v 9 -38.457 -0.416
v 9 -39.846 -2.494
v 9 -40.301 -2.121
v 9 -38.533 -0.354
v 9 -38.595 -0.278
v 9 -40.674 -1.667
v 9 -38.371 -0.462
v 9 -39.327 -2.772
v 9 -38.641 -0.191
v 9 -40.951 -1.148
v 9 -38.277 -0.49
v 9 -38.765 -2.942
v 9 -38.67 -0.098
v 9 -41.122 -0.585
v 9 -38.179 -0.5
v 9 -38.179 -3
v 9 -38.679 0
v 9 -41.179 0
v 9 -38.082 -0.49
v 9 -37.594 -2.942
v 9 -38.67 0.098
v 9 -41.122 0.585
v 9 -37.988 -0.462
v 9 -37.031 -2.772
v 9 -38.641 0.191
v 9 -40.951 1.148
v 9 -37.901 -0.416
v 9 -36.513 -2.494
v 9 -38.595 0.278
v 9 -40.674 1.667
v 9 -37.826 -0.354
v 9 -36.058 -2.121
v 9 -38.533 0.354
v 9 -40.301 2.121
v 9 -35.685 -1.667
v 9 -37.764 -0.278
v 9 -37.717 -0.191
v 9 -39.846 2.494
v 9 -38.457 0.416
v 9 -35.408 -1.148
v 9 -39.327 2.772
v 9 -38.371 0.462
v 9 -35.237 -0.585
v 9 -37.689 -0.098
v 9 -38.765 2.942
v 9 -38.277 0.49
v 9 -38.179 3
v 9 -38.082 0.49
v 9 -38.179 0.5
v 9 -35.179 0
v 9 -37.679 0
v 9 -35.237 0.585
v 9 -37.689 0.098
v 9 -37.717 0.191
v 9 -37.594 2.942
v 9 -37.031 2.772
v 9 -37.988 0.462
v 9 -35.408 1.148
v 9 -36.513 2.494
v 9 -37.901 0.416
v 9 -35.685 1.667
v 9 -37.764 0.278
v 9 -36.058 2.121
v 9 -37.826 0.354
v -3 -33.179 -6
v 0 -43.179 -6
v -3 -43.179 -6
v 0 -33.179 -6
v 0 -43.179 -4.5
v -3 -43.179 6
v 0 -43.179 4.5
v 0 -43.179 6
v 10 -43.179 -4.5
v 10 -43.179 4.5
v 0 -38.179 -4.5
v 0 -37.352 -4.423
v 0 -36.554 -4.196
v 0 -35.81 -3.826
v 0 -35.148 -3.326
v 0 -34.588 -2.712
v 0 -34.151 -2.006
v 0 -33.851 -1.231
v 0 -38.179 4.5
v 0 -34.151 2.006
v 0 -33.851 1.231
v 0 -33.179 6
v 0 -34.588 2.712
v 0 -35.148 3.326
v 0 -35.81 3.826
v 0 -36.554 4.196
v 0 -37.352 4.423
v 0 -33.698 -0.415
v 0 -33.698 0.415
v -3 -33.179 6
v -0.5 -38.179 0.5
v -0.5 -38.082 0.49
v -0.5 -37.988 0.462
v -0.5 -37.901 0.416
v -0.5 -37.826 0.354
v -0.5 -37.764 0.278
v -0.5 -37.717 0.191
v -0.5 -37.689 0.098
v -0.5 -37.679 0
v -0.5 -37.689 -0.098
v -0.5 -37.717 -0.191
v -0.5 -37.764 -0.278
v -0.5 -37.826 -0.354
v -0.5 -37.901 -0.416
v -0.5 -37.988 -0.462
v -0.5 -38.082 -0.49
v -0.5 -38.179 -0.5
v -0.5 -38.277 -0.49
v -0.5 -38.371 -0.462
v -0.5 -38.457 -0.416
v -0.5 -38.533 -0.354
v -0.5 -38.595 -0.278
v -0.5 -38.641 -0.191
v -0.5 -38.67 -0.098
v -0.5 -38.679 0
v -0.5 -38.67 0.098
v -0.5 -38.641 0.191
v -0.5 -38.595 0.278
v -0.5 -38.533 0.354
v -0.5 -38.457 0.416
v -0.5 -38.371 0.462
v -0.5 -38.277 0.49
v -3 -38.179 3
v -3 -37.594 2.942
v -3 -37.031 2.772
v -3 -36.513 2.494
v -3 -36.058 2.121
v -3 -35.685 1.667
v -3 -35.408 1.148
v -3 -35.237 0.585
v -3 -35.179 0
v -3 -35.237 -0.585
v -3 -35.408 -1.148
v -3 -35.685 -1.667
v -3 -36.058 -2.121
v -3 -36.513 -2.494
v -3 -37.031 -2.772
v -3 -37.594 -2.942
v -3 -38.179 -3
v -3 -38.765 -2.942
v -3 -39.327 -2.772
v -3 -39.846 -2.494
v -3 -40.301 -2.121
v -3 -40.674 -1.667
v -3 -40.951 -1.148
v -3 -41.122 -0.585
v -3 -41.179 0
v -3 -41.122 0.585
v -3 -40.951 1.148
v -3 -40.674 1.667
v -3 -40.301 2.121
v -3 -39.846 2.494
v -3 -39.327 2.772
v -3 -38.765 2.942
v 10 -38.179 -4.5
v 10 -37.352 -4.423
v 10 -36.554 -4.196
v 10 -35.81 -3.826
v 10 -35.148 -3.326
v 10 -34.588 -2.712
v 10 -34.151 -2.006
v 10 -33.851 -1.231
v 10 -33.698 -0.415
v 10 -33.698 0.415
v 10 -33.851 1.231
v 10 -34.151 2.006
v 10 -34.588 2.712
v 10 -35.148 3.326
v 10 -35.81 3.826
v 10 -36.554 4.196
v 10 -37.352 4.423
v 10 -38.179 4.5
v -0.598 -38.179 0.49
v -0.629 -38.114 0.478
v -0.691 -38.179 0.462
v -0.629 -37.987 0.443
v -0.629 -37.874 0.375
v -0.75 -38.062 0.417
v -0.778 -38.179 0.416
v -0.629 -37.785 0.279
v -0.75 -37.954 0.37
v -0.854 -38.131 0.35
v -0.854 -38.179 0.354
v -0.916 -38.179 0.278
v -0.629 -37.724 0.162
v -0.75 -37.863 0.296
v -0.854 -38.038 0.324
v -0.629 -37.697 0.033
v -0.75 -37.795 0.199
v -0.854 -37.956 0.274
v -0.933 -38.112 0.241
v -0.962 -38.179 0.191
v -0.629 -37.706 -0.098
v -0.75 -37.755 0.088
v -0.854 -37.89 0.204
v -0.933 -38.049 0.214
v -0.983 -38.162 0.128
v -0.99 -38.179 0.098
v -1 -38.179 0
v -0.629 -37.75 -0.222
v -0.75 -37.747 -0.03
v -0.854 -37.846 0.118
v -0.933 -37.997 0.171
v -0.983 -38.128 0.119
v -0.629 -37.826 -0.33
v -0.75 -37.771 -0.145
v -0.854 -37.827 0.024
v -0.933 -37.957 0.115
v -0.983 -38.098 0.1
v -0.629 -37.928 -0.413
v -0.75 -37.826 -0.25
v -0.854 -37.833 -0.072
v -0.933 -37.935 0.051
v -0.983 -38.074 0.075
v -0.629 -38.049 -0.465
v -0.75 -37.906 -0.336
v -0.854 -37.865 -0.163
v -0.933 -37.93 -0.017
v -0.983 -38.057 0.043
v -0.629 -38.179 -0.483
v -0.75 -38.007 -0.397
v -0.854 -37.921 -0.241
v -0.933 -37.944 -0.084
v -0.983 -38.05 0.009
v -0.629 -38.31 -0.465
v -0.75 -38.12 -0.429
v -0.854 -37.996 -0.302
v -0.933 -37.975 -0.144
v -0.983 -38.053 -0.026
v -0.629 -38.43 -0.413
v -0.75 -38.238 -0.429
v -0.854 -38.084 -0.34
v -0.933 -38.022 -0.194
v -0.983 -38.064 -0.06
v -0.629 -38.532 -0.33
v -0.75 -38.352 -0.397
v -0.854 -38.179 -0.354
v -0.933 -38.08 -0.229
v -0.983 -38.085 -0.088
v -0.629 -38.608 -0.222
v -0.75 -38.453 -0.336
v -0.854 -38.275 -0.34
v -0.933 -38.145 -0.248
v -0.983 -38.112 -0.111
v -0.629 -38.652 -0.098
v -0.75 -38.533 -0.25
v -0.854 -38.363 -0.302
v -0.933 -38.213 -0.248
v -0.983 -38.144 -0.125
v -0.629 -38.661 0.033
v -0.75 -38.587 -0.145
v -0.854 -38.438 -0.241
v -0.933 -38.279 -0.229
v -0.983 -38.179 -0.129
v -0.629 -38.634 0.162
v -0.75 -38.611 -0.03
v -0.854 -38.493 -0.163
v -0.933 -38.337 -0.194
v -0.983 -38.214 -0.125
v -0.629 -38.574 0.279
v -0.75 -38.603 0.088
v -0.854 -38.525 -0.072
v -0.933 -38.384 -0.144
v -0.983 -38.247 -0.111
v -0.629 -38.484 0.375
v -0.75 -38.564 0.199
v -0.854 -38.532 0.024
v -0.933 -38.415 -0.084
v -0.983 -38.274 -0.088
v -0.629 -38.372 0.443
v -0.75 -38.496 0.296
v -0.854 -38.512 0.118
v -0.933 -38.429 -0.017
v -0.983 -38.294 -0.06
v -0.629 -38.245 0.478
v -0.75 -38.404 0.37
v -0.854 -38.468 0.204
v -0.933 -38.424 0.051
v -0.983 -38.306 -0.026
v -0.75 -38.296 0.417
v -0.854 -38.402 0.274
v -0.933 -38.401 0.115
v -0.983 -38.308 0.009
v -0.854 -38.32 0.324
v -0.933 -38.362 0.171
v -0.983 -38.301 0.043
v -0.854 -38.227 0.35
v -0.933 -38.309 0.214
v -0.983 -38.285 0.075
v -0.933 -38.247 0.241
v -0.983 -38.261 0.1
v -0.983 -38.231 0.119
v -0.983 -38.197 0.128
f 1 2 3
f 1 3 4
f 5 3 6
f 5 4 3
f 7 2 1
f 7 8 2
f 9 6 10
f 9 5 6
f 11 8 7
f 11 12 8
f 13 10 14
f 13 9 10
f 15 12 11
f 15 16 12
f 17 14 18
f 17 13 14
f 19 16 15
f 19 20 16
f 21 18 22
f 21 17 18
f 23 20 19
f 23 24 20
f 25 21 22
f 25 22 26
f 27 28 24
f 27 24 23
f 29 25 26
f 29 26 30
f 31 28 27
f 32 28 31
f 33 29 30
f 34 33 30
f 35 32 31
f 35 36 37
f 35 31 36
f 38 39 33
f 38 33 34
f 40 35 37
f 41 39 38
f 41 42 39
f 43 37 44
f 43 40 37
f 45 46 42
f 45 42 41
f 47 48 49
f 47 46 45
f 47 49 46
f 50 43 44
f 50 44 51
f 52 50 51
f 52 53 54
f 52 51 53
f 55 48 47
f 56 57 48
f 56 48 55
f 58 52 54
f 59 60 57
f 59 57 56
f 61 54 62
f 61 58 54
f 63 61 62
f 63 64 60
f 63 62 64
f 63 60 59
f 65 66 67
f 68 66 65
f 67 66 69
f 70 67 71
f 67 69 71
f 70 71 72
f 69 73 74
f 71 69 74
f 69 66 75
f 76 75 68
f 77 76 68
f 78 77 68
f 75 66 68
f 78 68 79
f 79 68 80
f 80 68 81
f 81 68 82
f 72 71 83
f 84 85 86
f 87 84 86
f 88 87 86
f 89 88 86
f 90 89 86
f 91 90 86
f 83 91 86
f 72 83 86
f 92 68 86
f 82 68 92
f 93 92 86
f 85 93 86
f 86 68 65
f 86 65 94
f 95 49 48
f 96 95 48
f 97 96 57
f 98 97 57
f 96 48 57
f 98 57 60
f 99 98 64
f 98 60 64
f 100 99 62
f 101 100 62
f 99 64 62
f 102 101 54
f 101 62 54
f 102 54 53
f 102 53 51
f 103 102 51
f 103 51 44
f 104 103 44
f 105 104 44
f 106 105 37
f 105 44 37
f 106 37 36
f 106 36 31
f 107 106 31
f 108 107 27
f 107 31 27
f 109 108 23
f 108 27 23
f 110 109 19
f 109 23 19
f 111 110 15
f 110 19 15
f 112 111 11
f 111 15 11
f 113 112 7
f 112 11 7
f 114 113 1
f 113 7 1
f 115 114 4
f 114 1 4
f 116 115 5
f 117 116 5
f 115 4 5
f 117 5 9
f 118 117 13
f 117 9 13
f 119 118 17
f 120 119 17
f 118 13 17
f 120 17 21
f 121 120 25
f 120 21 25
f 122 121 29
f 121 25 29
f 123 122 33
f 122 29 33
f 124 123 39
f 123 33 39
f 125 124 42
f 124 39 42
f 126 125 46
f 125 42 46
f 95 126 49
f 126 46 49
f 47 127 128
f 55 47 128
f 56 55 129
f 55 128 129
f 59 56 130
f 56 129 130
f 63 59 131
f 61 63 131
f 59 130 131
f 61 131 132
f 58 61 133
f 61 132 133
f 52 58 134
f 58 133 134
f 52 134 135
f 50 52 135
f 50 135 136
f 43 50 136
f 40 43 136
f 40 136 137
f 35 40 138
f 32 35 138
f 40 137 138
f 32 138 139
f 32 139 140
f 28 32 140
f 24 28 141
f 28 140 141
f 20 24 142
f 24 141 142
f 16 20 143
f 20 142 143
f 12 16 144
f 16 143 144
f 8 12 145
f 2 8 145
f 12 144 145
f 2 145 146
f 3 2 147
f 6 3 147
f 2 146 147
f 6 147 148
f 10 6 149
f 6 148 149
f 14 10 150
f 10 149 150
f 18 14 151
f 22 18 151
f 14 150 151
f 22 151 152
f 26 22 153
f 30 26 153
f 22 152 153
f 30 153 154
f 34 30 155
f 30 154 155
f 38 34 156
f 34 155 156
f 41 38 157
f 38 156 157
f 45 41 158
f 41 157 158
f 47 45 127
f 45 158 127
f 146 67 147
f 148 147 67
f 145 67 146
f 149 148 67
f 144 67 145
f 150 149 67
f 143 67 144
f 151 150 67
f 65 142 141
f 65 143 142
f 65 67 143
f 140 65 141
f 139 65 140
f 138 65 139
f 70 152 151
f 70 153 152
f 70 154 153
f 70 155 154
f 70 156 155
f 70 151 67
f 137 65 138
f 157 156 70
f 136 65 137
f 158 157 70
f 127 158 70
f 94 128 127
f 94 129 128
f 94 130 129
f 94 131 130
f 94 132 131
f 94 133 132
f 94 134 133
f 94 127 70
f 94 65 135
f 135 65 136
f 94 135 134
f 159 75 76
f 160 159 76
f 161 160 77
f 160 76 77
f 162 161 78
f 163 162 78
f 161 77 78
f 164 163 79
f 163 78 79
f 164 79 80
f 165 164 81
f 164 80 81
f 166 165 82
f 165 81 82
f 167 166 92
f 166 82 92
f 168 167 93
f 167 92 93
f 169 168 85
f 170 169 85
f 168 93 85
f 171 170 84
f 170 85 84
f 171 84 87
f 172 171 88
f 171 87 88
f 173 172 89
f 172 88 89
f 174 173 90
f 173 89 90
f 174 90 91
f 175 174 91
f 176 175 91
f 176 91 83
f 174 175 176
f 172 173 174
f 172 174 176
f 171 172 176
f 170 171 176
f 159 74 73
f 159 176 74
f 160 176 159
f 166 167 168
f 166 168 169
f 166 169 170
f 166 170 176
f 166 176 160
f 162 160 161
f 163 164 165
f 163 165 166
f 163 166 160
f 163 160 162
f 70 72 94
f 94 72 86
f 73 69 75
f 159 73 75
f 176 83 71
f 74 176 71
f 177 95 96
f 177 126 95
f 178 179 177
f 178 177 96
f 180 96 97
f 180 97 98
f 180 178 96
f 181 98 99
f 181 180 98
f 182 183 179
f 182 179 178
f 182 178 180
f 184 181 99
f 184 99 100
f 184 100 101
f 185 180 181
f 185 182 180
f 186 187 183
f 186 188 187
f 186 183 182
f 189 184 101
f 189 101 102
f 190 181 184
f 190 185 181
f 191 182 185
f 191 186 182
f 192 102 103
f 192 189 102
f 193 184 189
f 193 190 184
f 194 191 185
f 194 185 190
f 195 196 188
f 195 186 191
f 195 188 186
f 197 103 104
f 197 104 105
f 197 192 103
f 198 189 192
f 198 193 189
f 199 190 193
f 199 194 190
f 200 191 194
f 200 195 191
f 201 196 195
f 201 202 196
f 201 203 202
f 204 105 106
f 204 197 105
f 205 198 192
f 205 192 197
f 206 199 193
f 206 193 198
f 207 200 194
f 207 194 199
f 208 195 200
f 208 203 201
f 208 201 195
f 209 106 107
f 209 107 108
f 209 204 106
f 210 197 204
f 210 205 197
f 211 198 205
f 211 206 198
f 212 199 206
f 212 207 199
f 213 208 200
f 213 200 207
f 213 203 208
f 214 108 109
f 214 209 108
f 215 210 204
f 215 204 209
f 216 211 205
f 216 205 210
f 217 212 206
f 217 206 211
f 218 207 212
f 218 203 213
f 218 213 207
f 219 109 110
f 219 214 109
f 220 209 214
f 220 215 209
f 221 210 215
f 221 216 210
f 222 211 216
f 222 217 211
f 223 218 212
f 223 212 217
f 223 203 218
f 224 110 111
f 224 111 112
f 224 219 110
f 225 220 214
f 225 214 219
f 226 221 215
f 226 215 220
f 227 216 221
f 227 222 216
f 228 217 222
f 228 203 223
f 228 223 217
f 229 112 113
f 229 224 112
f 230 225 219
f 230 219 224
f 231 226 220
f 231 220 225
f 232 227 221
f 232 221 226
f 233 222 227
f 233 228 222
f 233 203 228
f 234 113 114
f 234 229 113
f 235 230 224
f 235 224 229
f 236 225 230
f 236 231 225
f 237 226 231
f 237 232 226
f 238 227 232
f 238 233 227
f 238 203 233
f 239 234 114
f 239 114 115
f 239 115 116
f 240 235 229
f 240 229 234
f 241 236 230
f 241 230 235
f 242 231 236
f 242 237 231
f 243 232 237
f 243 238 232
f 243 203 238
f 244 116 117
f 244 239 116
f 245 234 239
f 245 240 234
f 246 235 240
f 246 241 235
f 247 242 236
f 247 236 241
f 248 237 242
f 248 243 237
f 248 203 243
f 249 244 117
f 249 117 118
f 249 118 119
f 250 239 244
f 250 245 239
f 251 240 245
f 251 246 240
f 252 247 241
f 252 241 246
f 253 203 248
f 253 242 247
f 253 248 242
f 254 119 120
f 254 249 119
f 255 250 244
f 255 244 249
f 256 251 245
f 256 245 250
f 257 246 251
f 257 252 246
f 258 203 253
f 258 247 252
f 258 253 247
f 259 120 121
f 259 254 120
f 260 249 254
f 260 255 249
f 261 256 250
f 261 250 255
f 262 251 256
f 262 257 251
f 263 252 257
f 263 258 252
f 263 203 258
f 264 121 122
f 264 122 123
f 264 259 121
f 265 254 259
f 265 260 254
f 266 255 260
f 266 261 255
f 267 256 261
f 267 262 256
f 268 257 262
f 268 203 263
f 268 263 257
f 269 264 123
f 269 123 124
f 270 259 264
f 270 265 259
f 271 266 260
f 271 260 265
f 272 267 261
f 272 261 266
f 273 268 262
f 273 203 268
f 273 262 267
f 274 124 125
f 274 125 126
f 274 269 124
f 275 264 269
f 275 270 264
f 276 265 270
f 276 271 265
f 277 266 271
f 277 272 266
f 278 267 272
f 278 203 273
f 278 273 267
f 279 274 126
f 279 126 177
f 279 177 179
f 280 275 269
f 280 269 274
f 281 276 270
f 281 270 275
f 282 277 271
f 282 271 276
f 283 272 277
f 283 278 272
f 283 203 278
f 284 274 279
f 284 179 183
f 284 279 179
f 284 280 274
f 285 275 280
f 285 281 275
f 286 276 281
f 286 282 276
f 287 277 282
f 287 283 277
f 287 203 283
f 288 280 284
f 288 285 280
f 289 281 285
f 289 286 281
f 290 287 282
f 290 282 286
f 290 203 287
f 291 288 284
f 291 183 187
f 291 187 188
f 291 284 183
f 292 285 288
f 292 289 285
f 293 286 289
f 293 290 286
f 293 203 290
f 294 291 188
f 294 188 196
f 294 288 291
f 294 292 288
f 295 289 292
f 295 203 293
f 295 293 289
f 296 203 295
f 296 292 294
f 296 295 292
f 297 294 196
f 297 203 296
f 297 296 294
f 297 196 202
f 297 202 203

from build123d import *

# Parameters (mm, degrees)
BOSS_EXTRUDE1_DEPTH = 10
SKETCH2_W           = 12
SKETCH2_H           = 10
BOSS_EXTRUDE2_DEPTH = 3
SKETCH3_R           = 3
CUT_EXTRUDE1_DEPTH  = 12
SKETCH4_R           = 0.5
BOSS_EXTRUDE3_DEPTH = 10
FILLET6_R           = 0.5


with BuildPart() as part:
    # Sketch1 → Boss-Extrude1 (new body)
    with BuildSketch(Plane(origin=(0, 0, 0), x_dir=(0, 0, -1), z_dir=(1, 0, 0))):
        with BuildLine():
            Line((-4.5, -43.179278244), (4.5, -43.179278244))
            Line((4.5, -43.179278244), (4.5, -38.179278244))
            ThreePointArc((4.5, -38.179278244), (0, -33.679278244), (-4.5, -38.179278244))
            Line((-4.5, -38.179278244), (-4.5, -43.179278244))
        make_face()
    extrude(amount=BOSS_EXTRUDE1_DEPTH)

    # Sketch2 → Boss-Extrude2 (add)
    with BuildSketch(Plane.ZY):
        with Locations((0, -38.179278244)):
            Rectangle(SKETCH2_W, SKETCH2_H)
    extrude(amount=BOSS_EXTRUDE2_DEPTH)

    # Sketch3 → Cut-Extrude1 (cut)
    with BuildSketch(Plane.ZY.offset(3)):
        with Locations((0, -38.179278244)):
            Circle(SKETCH3_R)
    extrude(amount=-CUT_EXTRUDE1_DEPTH, mode=Mode.SUBTRACT)

    # Sketch4 → Boss-Extrude3 (add)
    with BuildSketch(Plane.ZY.offset(-9)):
        with Locations((0, -38.179278244)):
            Circle(SKETCH4_R)
    extrude(amount=BOSS_EXTRUDE3_DEPTH)

    # Fillet6
    fillet6_edges = [part.edges().sort_by_distance(p)[0] for p in [
        (-1, -38.179278244, -0.5),
    ]]
    fillet(fillet6_edges, radius=FILLET6_R)


solid = part.part
